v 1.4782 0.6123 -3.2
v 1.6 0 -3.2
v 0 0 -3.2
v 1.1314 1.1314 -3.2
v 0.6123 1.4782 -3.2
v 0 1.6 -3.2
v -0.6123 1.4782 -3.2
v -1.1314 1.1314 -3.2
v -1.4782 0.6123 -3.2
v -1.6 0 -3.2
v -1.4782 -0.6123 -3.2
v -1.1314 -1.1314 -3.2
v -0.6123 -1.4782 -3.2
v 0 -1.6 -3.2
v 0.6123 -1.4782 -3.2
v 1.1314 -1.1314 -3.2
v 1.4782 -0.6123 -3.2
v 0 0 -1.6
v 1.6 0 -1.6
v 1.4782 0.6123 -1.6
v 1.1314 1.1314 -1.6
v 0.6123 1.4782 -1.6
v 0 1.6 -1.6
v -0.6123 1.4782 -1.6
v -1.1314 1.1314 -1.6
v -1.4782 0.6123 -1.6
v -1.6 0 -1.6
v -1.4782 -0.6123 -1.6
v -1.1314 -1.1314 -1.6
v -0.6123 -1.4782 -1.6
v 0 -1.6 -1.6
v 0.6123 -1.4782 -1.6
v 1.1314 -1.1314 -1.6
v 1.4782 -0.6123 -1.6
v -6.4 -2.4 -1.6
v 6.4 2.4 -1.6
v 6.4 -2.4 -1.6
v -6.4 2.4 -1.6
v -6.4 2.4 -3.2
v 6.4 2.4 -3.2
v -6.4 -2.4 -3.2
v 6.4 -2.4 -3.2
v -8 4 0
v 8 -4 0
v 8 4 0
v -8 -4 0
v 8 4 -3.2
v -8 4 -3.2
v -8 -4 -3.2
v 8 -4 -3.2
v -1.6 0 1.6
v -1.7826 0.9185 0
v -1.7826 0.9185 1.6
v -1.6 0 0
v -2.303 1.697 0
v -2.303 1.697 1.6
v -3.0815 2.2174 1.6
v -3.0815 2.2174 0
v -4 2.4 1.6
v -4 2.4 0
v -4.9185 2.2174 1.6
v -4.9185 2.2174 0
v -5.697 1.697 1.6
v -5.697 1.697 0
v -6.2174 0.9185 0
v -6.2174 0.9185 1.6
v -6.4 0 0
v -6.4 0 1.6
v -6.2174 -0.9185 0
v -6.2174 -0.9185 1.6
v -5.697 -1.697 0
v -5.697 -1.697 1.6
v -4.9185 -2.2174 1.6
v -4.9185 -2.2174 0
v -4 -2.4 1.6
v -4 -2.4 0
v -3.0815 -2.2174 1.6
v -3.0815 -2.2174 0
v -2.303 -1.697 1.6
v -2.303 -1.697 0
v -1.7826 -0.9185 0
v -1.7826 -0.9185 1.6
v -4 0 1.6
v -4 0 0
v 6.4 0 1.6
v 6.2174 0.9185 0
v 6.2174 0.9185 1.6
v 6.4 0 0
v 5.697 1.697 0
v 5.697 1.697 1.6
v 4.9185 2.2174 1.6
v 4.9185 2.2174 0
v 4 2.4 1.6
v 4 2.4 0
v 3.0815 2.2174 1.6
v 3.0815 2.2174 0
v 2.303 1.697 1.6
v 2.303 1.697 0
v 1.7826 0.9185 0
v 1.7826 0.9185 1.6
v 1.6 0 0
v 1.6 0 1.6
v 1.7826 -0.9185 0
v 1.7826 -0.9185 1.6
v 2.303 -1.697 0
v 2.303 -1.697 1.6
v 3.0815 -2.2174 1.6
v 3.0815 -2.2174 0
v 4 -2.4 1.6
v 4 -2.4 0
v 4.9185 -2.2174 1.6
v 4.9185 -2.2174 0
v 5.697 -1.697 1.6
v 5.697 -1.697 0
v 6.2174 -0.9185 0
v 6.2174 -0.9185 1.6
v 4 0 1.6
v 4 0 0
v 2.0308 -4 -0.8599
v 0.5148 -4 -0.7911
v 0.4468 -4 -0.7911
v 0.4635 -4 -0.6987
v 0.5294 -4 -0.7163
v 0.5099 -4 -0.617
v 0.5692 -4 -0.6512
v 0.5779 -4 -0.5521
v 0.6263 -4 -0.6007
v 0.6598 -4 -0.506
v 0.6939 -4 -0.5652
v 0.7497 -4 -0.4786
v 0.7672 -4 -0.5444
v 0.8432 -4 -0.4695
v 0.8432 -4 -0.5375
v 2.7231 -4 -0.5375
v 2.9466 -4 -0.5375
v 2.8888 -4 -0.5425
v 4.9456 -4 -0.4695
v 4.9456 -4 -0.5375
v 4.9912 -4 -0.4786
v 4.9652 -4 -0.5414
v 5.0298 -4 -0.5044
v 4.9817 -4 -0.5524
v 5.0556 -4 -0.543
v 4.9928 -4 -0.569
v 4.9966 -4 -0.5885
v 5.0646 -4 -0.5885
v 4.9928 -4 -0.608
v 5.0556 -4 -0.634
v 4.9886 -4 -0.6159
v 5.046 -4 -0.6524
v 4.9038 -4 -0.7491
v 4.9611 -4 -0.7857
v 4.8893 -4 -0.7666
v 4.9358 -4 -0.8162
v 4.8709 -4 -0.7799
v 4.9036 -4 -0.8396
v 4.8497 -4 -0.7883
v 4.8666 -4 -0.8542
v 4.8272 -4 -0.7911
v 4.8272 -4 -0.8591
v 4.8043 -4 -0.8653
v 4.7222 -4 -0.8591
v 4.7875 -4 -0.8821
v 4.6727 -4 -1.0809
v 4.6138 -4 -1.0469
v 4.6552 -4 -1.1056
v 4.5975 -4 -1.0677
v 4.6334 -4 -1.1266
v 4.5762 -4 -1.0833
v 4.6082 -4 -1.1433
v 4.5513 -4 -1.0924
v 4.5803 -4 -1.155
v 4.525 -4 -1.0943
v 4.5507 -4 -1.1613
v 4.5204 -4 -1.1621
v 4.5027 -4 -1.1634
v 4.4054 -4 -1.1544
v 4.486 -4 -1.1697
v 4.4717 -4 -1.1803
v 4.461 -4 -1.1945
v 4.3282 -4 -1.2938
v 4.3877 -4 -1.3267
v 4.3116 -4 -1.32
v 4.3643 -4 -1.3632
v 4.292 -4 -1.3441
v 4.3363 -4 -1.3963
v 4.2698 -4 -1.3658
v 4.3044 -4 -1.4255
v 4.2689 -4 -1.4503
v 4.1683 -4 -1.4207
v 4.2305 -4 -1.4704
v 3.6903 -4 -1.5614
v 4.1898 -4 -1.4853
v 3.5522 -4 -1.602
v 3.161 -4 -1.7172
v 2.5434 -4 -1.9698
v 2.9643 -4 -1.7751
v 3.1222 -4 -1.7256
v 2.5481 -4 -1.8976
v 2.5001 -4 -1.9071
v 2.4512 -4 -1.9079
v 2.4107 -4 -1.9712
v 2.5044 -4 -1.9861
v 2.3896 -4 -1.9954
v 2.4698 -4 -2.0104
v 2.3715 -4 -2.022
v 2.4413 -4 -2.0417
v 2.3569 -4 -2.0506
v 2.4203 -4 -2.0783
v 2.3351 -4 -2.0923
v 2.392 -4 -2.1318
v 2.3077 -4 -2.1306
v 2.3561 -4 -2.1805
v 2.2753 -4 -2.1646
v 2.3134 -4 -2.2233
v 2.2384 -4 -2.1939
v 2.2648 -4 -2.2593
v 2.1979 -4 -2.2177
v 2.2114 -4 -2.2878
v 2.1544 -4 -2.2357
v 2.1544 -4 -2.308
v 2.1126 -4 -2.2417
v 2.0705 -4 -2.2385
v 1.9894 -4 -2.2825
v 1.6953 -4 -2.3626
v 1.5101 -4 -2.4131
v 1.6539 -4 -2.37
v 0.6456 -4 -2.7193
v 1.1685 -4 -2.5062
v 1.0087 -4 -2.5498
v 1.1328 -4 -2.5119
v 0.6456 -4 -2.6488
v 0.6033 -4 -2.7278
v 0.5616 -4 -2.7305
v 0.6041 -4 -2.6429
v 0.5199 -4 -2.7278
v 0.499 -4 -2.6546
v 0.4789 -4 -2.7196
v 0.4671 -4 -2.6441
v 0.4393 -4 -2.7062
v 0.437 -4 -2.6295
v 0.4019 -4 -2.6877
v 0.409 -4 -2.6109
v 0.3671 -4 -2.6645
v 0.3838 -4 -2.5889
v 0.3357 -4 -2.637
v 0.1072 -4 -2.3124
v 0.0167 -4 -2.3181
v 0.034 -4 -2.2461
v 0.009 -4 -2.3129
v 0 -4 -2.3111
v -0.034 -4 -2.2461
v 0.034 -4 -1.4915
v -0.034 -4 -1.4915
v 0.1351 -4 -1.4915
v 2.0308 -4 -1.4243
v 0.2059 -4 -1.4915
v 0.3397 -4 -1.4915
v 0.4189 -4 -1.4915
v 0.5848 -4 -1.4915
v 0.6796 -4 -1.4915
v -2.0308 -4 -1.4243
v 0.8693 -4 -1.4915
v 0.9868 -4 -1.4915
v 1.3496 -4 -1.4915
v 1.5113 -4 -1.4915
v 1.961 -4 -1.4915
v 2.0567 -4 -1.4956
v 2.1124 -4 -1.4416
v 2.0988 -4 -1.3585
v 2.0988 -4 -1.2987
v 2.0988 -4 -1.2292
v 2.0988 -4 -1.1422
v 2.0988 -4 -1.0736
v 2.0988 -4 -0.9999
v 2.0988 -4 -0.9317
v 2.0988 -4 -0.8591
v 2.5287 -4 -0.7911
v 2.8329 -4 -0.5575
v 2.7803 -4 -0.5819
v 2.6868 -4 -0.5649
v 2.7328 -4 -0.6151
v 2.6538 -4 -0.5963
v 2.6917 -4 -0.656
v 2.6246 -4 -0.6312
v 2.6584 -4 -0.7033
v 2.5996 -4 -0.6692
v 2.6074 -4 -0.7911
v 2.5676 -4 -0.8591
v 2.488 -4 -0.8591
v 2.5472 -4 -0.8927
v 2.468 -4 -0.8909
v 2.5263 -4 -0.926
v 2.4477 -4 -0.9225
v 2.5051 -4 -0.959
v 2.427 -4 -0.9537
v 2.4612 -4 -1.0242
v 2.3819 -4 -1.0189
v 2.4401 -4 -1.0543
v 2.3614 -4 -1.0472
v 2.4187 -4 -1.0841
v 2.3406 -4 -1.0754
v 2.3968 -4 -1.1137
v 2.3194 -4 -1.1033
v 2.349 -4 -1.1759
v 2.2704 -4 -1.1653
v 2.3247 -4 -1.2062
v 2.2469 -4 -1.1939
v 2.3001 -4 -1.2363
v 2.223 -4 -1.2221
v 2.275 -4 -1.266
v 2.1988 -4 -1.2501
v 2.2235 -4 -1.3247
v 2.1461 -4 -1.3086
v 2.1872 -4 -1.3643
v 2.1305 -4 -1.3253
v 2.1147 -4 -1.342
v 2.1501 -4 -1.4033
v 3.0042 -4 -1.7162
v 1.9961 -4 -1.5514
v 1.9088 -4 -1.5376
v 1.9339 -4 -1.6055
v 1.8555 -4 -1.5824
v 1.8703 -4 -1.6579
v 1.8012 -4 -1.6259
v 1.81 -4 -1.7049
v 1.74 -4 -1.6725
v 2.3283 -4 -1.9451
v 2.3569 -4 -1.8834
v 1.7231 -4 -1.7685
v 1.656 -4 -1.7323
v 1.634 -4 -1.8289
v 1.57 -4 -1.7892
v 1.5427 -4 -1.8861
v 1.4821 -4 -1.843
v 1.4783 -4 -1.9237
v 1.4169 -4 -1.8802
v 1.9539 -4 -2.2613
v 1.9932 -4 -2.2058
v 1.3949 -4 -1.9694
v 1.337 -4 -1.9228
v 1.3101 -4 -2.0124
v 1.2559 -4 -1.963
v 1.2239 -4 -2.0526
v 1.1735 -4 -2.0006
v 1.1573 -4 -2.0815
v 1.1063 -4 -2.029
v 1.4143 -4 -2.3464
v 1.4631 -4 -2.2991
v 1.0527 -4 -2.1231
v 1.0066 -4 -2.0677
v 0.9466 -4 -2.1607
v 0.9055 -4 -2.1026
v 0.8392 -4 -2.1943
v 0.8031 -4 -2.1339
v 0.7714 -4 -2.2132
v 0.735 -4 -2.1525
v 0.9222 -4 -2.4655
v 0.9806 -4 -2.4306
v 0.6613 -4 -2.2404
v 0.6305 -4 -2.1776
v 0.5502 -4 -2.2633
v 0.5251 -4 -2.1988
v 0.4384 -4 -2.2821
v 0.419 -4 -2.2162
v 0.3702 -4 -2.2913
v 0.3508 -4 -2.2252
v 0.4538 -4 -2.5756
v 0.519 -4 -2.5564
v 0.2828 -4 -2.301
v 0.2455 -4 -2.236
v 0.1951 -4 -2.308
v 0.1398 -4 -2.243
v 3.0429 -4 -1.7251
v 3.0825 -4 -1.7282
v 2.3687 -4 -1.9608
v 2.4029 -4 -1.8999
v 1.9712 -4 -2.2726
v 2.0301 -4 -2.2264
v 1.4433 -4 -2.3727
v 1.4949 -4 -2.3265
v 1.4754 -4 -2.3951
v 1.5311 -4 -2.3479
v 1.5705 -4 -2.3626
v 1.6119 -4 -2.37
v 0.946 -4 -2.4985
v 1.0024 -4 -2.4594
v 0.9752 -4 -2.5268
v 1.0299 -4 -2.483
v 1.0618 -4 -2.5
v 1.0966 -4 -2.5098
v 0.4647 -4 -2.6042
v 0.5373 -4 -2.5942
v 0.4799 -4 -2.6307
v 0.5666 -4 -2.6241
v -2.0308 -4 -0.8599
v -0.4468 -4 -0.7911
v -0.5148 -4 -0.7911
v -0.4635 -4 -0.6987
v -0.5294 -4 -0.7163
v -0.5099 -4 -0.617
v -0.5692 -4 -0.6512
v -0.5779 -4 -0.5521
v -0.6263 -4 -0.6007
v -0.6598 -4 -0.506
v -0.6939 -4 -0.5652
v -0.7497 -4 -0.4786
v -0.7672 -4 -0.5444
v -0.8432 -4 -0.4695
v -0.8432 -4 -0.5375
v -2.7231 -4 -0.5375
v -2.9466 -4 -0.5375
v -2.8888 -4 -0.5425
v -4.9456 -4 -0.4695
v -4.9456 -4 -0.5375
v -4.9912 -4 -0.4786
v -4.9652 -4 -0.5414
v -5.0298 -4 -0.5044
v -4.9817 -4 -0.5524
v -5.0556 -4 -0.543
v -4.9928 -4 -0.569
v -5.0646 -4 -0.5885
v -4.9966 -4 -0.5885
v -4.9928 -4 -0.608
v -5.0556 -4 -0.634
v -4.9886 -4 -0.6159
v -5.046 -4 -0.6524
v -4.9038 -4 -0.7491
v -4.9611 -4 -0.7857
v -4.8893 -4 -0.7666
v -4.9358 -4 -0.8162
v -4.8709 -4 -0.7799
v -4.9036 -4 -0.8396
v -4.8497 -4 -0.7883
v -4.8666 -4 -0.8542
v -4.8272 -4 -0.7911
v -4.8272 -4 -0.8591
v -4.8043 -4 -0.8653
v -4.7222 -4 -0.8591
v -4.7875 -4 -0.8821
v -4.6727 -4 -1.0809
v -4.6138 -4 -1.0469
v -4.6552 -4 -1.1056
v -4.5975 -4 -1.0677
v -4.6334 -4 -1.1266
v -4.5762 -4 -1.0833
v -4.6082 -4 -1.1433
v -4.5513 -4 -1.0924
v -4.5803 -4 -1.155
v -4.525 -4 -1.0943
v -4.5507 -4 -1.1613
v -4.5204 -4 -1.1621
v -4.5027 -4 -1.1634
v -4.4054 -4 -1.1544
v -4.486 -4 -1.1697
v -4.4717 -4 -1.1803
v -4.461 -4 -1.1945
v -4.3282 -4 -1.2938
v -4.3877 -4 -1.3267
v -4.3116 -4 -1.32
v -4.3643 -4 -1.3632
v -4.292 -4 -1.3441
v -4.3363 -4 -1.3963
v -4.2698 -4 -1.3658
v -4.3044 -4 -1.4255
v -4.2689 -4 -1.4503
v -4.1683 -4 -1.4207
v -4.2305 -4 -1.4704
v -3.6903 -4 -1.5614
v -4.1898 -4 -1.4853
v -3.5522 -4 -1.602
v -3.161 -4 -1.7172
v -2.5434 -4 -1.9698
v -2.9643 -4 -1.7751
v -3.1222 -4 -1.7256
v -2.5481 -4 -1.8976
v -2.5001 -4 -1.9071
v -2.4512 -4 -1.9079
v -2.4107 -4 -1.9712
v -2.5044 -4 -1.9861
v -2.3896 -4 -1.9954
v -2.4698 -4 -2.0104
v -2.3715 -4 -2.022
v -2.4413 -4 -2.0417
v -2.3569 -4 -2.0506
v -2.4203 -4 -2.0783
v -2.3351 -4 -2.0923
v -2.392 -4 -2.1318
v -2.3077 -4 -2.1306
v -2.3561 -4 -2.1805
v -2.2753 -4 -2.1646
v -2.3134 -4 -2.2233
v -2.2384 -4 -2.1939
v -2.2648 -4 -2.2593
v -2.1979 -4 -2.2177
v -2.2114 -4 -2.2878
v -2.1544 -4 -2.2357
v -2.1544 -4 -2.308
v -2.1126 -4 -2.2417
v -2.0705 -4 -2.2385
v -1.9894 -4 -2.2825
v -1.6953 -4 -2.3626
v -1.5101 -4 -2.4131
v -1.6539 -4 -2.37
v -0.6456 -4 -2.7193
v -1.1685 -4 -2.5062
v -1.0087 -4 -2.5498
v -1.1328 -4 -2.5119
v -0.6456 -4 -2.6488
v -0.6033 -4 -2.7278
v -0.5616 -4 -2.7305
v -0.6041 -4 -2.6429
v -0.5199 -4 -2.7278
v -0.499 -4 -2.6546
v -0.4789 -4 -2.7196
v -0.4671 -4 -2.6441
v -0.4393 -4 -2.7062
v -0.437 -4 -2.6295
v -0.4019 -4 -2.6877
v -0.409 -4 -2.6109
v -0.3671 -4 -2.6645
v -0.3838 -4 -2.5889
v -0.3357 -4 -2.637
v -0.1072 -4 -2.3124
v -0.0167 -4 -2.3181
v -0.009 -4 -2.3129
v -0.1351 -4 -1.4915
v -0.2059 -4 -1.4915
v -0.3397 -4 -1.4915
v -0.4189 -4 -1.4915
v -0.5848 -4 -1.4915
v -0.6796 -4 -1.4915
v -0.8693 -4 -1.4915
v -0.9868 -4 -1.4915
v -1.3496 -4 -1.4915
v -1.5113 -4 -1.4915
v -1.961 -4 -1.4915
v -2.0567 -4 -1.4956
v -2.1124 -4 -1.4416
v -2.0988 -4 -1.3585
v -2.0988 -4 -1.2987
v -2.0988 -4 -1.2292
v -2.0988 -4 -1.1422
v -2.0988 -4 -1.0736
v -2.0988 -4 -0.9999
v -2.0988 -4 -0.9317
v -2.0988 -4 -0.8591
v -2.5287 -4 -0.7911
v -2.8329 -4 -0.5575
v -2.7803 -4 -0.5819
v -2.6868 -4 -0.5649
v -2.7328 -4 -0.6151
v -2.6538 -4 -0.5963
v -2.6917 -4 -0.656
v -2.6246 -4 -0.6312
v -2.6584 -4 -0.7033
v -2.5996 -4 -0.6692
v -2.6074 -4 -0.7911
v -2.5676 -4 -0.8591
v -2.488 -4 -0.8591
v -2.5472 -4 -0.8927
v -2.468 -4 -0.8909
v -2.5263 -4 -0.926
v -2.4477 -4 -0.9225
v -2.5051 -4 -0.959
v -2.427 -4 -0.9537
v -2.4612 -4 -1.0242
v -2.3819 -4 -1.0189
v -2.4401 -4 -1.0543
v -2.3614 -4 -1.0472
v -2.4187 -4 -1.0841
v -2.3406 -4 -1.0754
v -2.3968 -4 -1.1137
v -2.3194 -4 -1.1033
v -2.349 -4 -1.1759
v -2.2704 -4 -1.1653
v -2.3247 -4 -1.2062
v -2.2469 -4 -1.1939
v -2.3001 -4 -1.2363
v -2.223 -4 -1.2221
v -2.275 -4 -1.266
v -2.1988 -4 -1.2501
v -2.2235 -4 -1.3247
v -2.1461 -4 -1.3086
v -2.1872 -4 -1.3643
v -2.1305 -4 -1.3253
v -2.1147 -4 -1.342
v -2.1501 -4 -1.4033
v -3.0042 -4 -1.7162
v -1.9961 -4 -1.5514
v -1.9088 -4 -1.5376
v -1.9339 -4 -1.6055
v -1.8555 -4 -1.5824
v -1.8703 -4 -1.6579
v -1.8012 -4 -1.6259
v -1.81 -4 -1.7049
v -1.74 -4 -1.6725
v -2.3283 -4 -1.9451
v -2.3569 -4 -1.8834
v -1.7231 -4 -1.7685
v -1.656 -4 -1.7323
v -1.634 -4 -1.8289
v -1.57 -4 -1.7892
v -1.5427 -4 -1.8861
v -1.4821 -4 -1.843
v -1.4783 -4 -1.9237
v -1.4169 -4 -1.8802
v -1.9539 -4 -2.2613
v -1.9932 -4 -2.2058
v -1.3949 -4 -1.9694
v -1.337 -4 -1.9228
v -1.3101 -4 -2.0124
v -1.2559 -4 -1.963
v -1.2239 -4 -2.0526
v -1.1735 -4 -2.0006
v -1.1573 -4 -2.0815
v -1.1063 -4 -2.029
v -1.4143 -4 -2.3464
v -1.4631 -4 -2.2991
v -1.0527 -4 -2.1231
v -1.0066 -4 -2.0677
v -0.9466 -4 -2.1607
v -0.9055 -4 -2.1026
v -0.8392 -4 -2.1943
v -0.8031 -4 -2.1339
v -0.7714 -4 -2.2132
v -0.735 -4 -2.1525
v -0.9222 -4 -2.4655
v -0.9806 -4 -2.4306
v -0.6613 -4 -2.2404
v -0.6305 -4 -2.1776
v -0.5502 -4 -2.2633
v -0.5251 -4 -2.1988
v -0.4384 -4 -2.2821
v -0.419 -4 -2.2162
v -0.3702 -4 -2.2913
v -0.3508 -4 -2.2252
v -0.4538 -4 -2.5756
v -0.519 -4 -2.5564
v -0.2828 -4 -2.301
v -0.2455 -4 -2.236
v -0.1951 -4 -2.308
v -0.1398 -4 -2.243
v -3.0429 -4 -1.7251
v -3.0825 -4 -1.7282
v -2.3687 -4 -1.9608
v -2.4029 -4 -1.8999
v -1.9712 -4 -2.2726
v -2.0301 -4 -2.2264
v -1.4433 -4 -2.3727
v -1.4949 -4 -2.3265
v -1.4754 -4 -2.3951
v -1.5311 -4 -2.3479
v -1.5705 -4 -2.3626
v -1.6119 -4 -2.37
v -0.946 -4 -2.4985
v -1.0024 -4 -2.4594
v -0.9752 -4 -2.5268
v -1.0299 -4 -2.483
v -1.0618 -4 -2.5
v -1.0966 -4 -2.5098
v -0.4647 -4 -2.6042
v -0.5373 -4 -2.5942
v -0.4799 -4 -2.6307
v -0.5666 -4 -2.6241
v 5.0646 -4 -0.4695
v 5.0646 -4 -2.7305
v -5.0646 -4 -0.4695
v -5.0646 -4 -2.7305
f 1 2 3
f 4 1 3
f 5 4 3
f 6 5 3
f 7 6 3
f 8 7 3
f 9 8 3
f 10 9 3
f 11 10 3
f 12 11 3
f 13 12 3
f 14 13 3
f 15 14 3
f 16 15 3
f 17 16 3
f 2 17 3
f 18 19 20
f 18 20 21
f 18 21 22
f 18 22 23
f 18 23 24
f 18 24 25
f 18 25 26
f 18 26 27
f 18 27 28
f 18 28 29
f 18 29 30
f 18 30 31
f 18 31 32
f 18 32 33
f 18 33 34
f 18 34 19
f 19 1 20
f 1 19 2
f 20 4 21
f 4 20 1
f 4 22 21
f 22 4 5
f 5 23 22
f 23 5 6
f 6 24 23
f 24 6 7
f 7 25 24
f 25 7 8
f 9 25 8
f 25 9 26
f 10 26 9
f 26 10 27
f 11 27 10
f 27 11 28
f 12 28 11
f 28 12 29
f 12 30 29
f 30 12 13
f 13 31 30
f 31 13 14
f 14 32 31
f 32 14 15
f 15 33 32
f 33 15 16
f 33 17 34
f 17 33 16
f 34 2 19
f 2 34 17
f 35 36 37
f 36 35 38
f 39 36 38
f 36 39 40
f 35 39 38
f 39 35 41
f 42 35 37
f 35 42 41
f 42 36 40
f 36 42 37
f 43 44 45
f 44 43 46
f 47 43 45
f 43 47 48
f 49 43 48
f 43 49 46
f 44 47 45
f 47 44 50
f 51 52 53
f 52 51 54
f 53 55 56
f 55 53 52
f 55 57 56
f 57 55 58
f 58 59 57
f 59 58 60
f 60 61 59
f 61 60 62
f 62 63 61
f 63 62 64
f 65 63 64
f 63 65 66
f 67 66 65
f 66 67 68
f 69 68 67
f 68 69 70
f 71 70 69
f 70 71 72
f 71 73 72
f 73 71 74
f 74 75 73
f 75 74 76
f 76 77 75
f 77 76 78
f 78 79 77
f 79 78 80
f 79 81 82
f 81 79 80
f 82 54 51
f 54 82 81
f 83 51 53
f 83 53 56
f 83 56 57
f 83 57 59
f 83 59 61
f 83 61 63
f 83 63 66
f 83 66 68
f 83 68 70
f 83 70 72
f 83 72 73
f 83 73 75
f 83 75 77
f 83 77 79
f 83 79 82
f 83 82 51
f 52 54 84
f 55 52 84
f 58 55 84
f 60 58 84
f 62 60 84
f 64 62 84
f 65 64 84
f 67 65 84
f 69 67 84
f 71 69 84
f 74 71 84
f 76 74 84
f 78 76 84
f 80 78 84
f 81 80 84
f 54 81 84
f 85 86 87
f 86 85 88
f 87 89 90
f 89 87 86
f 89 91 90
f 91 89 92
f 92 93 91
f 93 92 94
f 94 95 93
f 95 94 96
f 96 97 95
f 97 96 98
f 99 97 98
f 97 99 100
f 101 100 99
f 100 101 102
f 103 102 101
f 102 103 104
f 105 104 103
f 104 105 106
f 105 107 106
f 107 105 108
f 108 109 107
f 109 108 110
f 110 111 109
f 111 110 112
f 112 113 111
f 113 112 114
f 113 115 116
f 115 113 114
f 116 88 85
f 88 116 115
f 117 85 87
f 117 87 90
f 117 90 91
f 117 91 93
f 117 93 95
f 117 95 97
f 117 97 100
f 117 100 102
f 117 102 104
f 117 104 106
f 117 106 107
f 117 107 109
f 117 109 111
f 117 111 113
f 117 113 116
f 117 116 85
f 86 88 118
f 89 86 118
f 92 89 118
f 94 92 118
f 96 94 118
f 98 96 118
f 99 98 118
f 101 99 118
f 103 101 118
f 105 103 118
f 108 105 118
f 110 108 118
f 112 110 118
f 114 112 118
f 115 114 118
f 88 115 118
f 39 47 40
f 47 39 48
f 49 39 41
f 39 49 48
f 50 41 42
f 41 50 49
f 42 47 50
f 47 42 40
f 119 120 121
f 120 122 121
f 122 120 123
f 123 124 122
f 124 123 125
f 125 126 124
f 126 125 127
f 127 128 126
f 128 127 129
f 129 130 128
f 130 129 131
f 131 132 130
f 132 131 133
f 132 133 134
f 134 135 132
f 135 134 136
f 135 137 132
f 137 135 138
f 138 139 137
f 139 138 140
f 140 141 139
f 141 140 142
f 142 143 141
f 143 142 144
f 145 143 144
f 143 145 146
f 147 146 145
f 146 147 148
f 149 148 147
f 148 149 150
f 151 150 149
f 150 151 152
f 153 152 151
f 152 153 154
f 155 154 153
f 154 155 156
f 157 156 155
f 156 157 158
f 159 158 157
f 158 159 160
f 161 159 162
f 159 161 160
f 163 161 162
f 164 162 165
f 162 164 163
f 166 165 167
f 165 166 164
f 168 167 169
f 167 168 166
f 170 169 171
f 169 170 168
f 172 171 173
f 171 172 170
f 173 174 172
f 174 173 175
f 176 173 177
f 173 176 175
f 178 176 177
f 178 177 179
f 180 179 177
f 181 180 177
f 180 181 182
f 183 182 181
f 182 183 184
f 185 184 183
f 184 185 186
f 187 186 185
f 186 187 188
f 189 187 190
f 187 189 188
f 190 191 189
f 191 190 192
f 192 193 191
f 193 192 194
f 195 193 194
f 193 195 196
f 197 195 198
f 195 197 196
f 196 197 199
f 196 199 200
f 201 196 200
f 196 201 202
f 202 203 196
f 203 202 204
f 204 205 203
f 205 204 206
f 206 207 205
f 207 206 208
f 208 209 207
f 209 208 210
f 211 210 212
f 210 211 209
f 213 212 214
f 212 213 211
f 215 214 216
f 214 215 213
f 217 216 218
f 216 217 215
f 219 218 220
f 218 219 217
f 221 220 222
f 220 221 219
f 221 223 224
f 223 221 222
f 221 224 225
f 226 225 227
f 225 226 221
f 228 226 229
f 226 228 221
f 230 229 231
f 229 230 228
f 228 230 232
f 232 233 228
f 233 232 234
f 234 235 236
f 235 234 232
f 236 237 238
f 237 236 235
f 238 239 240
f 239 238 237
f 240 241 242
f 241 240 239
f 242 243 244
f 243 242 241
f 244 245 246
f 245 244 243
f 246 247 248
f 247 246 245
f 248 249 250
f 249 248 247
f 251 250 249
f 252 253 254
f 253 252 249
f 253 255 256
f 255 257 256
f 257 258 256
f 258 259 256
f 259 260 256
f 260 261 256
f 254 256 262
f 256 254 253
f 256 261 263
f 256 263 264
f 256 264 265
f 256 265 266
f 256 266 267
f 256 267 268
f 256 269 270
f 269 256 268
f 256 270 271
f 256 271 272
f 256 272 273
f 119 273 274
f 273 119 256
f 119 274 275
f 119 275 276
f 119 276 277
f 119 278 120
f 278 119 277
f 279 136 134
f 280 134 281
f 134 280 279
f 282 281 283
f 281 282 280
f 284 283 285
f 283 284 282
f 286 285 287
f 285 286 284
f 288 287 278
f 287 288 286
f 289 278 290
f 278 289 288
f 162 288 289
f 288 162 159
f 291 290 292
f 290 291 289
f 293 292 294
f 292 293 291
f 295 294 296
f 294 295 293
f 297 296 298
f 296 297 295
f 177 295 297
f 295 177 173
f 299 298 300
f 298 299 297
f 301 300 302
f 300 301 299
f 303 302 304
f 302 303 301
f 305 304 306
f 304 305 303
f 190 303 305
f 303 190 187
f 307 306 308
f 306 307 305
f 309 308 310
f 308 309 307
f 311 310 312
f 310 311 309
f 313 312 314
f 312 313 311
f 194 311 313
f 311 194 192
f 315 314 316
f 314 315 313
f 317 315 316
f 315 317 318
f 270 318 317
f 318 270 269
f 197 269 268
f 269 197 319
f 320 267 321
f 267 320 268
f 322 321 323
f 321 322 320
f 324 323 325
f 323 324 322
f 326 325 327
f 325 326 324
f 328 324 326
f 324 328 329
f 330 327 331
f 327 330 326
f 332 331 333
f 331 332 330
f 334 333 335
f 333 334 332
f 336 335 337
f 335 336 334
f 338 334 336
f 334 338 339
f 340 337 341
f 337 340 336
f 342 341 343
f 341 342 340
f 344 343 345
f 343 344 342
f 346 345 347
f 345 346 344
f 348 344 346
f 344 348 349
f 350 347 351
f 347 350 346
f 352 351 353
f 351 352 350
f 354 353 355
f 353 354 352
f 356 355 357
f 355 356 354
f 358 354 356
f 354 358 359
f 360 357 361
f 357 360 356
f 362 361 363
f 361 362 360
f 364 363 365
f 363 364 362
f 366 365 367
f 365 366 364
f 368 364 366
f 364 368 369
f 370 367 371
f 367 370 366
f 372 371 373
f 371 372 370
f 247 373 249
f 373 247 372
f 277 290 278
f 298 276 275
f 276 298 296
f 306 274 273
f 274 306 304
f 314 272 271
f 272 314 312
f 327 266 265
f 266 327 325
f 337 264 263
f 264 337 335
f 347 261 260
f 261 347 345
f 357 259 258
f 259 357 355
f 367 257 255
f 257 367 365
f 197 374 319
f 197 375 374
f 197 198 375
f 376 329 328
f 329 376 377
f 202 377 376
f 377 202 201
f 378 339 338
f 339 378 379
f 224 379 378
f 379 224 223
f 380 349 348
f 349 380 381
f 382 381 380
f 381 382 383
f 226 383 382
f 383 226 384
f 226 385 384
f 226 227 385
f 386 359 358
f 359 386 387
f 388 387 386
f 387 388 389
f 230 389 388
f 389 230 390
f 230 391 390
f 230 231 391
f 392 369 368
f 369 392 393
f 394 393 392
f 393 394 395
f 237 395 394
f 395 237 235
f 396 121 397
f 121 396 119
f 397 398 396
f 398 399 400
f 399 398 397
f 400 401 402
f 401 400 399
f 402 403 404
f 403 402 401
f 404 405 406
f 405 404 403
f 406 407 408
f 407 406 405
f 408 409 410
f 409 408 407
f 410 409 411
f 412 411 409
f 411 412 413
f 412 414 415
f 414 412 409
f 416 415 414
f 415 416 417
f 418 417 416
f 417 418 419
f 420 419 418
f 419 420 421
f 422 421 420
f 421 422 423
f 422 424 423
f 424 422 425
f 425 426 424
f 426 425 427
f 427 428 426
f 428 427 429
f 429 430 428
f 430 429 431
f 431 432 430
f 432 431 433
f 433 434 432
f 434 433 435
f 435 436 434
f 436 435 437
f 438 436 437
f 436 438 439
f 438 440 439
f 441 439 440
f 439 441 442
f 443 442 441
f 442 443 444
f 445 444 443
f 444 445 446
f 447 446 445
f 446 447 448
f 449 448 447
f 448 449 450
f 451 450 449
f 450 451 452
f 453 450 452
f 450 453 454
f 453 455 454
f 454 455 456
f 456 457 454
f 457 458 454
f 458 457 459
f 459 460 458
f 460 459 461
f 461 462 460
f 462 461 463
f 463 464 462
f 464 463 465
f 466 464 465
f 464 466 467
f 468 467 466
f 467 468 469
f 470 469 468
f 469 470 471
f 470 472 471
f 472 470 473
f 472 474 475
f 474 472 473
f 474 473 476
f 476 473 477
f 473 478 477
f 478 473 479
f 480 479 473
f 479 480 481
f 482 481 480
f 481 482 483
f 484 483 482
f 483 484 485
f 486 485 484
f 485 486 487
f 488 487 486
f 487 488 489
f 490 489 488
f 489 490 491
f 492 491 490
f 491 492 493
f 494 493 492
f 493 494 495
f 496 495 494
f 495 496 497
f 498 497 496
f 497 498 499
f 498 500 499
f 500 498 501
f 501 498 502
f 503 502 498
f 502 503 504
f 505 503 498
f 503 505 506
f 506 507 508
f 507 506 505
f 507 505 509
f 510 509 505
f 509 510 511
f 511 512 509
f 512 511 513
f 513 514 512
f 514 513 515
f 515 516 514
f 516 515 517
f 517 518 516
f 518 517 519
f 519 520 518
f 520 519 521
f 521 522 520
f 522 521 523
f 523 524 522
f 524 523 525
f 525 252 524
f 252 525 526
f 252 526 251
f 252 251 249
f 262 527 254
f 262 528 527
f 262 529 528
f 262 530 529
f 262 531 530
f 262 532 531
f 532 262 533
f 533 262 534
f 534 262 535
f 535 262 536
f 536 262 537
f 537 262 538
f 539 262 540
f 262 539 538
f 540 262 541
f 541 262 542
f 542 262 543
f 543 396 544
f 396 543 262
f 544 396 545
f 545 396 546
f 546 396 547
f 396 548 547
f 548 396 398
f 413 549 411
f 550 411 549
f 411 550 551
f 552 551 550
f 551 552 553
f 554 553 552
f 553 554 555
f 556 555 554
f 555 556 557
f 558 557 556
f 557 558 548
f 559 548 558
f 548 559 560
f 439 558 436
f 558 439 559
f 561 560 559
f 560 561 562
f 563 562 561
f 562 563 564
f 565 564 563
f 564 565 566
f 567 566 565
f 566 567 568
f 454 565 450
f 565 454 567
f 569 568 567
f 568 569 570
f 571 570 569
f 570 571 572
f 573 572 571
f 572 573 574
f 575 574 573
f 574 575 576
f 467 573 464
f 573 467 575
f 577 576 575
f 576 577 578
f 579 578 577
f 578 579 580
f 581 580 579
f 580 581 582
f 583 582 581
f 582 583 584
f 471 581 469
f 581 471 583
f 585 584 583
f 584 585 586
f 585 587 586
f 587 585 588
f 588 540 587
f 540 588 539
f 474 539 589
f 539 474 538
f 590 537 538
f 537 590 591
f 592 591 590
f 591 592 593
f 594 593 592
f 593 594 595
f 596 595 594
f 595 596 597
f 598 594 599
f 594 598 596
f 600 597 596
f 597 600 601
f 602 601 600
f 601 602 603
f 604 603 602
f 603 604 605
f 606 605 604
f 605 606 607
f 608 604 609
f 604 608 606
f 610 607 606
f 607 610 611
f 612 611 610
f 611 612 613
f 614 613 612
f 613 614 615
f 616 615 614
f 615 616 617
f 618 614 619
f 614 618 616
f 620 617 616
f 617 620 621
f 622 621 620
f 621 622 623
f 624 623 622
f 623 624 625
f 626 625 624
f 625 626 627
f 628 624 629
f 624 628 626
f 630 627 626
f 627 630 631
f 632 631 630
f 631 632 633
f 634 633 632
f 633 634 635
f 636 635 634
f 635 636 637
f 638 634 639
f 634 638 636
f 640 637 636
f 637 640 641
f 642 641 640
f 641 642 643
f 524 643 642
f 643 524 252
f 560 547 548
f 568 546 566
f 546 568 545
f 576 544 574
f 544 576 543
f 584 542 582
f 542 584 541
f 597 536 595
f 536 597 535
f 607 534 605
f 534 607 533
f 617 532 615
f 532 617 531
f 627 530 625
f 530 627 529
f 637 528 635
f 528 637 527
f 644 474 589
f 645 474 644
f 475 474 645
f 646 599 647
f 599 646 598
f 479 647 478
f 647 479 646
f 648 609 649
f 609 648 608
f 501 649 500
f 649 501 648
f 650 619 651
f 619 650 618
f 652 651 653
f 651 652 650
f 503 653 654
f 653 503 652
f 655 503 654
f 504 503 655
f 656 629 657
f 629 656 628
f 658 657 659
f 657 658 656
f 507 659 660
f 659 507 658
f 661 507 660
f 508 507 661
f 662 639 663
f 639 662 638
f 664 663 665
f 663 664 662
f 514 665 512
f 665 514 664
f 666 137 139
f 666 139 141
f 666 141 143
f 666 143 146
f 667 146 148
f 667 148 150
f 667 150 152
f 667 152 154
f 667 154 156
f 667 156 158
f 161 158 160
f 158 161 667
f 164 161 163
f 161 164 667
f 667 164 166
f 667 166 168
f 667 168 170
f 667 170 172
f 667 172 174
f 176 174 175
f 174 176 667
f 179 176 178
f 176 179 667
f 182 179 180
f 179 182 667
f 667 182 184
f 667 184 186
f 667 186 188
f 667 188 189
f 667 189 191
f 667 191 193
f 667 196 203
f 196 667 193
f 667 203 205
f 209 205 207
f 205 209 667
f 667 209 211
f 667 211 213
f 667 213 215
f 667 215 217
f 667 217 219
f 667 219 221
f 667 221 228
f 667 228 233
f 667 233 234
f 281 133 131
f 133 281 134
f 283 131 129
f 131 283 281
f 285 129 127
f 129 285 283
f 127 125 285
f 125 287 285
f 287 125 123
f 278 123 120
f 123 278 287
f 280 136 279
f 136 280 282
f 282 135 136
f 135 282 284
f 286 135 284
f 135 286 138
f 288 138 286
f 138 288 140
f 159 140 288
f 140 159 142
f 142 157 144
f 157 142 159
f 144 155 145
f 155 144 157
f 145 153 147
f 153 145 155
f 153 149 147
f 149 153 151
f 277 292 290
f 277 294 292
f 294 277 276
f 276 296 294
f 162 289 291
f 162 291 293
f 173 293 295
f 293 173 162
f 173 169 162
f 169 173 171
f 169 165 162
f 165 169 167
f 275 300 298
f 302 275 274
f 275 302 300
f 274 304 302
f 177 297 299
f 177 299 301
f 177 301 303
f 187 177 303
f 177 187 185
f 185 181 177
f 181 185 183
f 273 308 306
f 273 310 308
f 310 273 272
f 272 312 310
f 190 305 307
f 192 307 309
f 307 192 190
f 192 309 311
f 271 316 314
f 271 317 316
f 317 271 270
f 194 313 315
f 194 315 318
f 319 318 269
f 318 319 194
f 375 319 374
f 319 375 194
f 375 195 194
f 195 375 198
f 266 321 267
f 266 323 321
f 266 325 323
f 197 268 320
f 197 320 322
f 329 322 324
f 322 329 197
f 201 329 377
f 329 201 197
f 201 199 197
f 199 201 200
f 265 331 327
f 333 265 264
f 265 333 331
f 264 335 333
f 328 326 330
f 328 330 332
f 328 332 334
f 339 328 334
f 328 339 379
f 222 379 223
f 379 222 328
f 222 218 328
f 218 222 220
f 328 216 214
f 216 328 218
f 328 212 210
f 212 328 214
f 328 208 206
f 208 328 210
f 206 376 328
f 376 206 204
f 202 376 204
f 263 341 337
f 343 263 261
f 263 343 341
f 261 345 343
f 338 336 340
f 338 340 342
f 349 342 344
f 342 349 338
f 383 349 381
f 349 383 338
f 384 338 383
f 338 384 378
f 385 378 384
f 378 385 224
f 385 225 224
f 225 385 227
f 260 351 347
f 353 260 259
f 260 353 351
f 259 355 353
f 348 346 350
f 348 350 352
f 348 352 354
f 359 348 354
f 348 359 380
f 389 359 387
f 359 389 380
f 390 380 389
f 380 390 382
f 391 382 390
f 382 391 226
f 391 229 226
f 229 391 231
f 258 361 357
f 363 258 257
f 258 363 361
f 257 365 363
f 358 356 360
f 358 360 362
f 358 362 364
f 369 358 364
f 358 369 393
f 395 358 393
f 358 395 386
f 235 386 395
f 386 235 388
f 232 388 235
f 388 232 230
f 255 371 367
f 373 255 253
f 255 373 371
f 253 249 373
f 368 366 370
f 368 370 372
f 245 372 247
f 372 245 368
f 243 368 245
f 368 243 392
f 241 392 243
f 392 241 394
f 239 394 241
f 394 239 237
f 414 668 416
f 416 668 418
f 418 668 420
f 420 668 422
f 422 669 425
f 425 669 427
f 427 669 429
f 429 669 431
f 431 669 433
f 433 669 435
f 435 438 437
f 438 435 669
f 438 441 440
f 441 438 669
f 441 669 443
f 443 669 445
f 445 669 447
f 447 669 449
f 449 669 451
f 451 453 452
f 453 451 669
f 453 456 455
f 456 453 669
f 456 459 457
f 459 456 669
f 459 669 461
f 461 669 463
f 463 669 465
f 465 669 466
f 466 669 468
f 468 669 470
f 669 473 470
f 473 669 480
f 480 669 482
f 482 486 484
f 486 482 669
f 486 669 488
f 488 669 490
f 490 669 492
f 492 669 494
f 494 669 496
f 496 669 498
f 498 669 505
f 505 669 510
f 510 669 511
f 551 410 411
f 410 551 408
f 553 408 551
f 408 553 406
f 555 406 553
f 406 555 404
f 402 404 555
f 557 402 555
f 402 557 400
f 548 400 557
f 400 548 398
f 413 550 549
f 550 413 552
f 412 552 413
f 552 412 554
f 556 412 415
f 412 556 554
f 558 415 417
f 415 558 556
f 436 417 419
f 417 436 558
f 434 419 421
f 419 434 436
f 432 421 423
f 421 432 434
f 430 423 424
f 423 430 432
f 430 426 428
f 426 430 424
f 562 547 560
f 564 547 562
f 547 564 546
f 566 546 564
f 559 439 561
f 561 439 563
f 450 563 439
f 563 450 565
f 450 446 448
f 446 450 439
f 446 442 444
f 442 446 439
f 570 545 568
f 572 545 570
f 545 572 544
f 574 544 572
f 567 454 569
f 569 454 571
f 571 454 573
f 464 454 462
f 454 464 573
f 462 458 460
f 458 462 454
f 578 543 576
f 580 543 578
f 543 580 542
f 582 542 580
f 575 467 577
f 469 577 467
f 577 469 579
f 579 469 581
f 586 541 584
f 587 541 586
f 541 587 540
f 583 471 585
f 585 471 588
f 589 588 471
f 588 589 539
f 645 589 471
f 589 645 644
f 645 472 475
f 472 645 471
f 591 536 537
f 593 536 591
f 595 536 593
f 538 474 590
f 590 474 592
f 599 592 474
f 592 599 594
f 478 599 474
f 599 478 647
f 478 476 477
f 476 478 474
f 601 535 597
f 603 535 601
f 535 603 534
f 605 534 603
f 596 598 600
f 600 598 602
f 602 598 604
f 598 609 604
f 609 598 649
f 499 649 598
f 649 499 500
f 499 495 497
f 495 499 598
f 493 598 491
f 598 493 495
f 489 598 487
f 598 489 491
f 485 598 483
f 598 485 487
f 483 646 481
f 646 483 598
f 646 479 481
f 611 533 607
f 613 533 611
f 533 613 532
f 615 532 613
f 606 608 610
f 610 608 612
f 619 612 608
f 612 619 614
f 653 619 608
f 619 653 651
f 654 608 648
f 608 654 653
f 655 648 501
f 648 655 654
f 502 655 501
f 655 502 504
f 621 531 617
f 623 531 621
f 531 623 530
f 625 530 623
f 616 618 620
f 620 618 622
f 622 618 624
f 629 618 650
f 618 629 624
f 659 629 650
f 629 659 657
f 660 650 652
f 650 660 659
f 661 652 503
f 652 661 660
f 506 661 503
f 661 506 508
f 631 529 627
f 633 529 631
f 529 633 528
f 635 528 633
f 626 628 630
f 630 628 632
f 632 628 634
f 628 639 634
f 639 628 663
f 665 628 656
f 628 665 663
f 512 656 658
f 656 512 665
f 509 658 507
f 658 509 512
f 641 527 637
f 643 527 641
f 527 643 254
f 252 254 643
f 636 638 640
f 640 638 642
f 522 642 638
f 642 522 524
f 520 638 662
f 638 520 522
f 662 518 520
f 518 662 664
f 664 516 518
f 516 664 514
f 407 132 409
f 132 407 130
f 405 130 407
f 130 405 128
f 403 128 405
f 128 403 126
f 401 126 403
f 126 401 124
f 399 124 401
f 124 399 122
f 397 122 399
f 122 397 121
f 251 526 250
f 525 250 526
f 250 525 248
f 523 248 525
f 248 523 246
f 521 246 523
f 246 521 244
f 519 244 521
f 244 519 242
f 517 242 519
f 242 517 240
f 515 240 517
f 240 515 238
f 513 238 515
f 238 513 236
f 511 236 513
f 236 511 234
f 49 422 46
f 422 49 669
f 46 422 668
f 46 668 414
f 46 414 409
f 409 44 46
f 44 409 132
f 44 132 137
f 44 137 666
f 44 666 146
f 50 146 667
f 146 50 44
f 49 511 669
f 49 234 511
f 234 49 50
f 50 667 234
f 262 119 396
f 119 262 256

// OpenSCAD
use <../lib.scad>
use <../p/logo-aston-martin-icon-box.scad>
use <../p/logo-aston-martin-icon.scad>
use <s/3023bs01.scad>
function ldraw_lib__3023bpy0() = [
// 0 Plate  1 x  2 with Silver Aston Martin Logo on Front Face Pattern
// 0 Name: 3023bpy0.dat
// 0 Author: Massimo Maso [Sirio]
// 0 !LDRAW_ORG Part UPDATE 2025-06
// 0 !LICENSE Licensed under CC BY 4.0 : see CAreadme.txt
// 
// 0 BFC CERTIFY CCW
  [0,"BFC","CERTIFY"],
  [0,"BFC","CCW"],
// 
// 0 !KEYWORDS Bricklink 3023pb03, GT3, Rebrickable 3023pr0002, Set 76910
// 0 !KEYWORDS Speed Champions, Vantage
// 
// 0 !HISTORY 2025-06-26 [OrionP] Official Update 2025-06
// 
// 0 // Subparts
// 1 16 0 0 0 1 0 0 0 1 0 0 0 1 s\3023bs01.dat
  [1,16,0,0,0,1,0,0,0,1,0,0,0,1, ldraw_lib__s__3023bs01()],
// 1 80 0 4 -10 .17 0 0 0 0 -.17 0 1 0 logo-aston-martin-icon.dat
  [1,80,0,4,-10,.17,0,0,0,0,-.17,0,1,0, ldraw_lib__logo_aston_martin_icon()],
// 1 16 0 4 -10 .17 0 0 0 0 -.17 0 1 0 logo-aston-martin-icon-box.dat
  [1,16,0,4,-10,.17,0,0,0,0,-.17,0,1,0, ldraw_lib__logo_aston_martin_icon_box()],
// 0 // Patterned face
// 4 16 -20 0 -10 -20 8 -10 -12.6616 6.82625 -10 -12.6616 1.47125 -10
  [4,16,-20,0,-10,-20,8,-10,-12.6616,6.82625,-10,-12.6616,1.47125,-10],
// 3 16 -20 0 -10 -12.6616 1.47125 -10 -12.6616 1.17375 -10
  [3,16,-20,0,-10,-12.6616,1.47125,-10,-12.6616,1.17375,-10],
// 3 16 -20 0 -10 -12.6616 1.17375 -10 -12.3641 1.17375 -10
  [3,16,-20,0,-10,-12.6616,1.17375,-10,-12.3641,1.17375,-10],
// 3 16 -20 0 -10 -12.3641 1.17375 -10 -2.108 1.17375 -10
  [3,16,-20,0,-10,-12.3641,1.17375,-10,-2.108,1.17375,-10],
// 4 16 -20 0 -10 -2.108 1.17375 -10 2.108 1.17375 -10 20 0 -10
  [4,16,-20,0,-10,-2.108,1.17375,-10,2.108,1.17375,-10,20,0,-10],
// 3 16 20 0 -10 2.108 1.17375 -10 12.3641 1.17375 -10
  [3,16,20,0,-10,2.108,1.17375,-10,12.3641,1.17375,-10],
// 3 16 20 0 -10 12.3641 1.17375 -10 12.6616 1.17375 -10
  [3,16,20,0,-10,12.3641,1.17375,-10,12.6616,1.17375,-10],
// 3 16 20 0 -10 12.6616 1.17375 -10 12.6616 1.47125 -10
  [3,16,20,0,-10,12.6616,1.17375,-10,12.6616,1.47125,-10],
// 4 16 20 0 -10 12.6616 1.47125 -10 12.6616 6.82625 -10 20 8 -10
  [4,16,20,0,-10,12.6616,1.47125,-10,12.6616,6.82625,-10,20,8,-10],
// 3 16 -20 8 -10 -1.403928 6.82625 -10 -12.6616 6.82625 -10
  [3,16,-20,8,-10,-1.403928,6.82625,-10,-12.6616,6.82625,-10],
// 4 16 -20 8 -10 20 8 -10 1.403928 6.82625 -10 -1.403928 6.82625 -10
  [4,16,-20,8,-10,20,8,-10,1.403928,6.82625,-10,-1.403928,6.82625,-10],
// 3 16 20 8 -10 12.6616 6.82625 -10 1.403928 6.82625 -10
  [3,16,20,8,-10,12.6616,6.82625,-10,1.403928,6.82625,-10],
// 4 16 -5.07705 2.149822 -10 -5.07705 3.560822 -10 5.07705 3.560822 -10 5.07705 2.149822 -10
  [4,16,-5.07705,2.149822,-10,-5.07705,3.560822,-10,5.07705,3.560822,-10,5.07705,2.149822,-10],
];
module ldraw_lib__3023bpy0(step=0, col=false, unit=2/5, alt=false, line=0.2, solid=!$preview)
    makepoly(ldraw_lib__3023bpy0(), step=step, col=col, unit=unit, alt=alt, line=line, solid=solid);
ldraw_lib__3023bpy0(line=0.2);
